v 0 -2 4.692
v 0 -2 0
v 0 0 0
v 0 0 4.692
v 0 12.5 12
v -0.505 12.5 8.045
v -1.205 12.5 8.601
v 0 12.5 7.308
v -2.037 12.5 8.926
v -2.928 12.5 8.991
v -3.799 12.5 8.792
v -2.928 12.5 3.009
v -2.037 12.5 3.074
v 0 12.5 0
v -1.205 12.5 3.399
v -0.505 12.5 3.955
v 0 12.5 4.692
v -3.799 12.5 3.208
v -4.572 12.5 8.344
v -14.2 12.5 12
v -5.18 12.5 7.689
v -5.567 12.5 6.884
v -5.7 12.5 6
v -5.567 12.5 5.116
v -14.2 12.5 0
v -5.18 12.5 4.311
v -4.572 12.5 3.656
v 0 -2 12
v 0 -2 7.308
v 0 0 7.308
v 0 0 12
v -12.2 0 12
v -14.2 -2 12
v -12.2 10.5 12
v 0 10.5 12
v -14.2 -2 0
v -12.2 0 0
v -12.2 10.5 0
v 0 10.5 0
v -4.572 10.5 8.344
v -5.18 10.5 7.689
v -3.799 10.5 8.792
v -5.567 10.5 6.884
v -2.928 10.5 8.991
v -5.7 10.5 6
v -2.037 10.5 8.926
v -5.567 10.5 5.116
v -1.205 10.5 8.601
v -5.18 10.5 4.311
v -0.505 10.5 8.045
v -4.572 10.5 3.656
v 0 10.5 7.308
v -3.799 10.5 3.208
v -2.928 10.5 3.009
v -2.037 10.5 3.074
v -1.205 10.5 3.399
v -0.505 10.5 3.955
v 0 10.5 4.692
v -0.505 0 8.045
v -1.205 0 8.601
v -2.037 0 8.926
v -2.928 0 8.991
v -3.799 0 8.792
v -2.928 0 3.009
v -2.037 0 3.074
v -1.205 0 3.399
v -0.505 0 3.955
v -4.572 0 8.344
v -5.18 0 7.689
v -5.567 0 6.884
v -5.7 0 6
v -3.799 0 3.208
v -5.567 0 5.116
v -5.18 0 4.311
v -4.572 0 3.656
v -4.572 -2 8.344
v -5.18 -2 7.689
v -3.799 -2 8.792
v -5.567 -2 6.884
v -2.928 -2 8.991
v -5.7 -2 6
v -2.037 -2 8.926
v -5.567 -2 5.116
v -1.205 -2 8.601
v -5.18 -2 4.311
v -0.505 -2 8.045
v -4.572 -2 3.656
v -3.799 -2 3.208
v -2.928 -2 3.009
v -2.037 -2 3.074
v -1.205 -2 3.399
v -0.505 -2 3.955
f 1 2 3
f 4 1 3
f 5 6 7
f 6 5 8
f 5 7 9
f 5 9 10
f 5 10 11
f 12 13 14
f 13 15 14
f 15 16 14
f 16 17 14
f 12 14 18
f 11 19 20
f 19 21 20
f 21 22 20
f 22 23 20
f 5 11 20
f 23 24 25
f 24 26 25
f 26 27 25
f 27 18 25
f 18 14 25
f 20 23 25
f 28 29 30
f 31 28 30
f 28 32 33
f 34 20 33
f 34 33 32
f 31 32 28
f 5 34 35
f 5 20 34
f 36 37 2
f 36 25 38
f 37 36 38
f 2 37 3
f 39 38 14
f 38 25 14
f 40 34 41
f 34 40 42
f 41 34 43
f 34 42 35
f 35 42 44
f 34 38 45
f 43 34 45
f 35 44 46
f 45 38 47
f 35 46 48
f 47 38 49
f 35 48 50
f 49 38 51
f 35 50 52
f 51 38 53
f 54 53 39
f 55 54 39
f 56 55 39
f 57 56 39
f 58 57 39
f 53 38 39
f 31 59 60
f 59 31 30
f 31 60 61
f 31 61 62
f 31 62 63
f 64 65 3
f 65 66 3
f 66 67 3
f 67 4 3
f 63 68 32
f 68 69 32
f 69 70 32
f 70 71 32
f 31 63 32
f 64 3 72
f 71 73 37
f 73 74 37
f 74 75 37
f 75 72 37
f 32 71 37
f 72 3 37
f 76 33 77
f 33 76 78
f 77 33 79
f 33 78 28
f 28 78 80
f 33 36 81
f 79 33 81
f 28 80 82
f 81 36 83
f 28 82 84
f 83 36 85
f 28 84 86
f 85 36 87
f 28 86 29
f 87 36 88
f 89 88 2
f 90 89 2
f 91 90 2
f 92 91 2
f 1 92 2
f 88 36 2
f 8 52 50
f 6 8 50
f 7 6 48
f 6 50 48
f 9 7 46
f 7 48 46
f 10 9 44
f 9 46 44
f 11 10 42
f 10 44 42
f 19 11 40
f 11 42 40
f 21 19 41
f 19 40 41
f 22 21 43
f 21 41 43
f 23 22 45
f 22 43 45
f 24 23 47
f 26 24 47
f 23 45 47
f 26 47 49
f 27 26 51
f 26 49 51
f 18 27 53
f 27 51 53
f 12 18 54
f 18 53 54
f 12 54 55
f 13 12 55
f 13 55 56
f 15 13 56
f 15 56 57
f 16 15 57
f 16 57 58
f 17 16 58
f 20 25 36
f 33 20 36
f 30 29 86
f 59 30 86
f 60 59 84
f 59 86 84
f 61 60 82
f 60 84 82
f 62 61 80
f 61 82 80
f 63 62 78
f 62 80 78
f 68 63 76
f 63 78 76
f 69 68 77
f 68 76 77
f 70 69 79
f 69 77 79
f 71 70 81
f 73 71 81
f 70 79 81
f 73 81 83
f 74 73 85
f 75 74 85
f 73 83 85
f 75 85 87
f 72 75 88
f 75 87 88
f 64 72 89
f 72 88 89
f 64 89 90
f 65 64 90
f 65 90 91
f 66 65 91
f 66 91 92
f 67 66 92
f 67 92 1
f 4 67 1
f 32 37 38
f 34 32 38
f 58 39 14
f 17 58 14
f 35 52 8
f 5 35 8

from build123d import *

# Parameters (mm, degrees)
F1_DEPTH = 12
F3_DEPTH = 33


with BuildPart() as f1:
    # F0 (on Top) → F1 (new body)
    with BuildSketch(Plane.XY):
        Polygon((0, -2), (0, 0), (-12.2, 0), (-12.2, 10.5), (0, 10.5), (0, 12.5), (-14.2, 12.5), (-14.2, -2), align=None)
    extrude(amount=F1_DEPTH)

    # F2 (on face) → F3 (cut, symmetric)
    with BuildSketch(Plane.XZ.offset(2)):
        with BuildLine():
            Line((0, 4.69233), (0, 7.30767))
            ThreePointArc((0, 7.30767), (-5.7, 6), (0, 4.69233))
        make_face()
    extrude(amount=F3_DEPTH, both=True, mode=Mode.SUBTRACT)


solid = f1.part
